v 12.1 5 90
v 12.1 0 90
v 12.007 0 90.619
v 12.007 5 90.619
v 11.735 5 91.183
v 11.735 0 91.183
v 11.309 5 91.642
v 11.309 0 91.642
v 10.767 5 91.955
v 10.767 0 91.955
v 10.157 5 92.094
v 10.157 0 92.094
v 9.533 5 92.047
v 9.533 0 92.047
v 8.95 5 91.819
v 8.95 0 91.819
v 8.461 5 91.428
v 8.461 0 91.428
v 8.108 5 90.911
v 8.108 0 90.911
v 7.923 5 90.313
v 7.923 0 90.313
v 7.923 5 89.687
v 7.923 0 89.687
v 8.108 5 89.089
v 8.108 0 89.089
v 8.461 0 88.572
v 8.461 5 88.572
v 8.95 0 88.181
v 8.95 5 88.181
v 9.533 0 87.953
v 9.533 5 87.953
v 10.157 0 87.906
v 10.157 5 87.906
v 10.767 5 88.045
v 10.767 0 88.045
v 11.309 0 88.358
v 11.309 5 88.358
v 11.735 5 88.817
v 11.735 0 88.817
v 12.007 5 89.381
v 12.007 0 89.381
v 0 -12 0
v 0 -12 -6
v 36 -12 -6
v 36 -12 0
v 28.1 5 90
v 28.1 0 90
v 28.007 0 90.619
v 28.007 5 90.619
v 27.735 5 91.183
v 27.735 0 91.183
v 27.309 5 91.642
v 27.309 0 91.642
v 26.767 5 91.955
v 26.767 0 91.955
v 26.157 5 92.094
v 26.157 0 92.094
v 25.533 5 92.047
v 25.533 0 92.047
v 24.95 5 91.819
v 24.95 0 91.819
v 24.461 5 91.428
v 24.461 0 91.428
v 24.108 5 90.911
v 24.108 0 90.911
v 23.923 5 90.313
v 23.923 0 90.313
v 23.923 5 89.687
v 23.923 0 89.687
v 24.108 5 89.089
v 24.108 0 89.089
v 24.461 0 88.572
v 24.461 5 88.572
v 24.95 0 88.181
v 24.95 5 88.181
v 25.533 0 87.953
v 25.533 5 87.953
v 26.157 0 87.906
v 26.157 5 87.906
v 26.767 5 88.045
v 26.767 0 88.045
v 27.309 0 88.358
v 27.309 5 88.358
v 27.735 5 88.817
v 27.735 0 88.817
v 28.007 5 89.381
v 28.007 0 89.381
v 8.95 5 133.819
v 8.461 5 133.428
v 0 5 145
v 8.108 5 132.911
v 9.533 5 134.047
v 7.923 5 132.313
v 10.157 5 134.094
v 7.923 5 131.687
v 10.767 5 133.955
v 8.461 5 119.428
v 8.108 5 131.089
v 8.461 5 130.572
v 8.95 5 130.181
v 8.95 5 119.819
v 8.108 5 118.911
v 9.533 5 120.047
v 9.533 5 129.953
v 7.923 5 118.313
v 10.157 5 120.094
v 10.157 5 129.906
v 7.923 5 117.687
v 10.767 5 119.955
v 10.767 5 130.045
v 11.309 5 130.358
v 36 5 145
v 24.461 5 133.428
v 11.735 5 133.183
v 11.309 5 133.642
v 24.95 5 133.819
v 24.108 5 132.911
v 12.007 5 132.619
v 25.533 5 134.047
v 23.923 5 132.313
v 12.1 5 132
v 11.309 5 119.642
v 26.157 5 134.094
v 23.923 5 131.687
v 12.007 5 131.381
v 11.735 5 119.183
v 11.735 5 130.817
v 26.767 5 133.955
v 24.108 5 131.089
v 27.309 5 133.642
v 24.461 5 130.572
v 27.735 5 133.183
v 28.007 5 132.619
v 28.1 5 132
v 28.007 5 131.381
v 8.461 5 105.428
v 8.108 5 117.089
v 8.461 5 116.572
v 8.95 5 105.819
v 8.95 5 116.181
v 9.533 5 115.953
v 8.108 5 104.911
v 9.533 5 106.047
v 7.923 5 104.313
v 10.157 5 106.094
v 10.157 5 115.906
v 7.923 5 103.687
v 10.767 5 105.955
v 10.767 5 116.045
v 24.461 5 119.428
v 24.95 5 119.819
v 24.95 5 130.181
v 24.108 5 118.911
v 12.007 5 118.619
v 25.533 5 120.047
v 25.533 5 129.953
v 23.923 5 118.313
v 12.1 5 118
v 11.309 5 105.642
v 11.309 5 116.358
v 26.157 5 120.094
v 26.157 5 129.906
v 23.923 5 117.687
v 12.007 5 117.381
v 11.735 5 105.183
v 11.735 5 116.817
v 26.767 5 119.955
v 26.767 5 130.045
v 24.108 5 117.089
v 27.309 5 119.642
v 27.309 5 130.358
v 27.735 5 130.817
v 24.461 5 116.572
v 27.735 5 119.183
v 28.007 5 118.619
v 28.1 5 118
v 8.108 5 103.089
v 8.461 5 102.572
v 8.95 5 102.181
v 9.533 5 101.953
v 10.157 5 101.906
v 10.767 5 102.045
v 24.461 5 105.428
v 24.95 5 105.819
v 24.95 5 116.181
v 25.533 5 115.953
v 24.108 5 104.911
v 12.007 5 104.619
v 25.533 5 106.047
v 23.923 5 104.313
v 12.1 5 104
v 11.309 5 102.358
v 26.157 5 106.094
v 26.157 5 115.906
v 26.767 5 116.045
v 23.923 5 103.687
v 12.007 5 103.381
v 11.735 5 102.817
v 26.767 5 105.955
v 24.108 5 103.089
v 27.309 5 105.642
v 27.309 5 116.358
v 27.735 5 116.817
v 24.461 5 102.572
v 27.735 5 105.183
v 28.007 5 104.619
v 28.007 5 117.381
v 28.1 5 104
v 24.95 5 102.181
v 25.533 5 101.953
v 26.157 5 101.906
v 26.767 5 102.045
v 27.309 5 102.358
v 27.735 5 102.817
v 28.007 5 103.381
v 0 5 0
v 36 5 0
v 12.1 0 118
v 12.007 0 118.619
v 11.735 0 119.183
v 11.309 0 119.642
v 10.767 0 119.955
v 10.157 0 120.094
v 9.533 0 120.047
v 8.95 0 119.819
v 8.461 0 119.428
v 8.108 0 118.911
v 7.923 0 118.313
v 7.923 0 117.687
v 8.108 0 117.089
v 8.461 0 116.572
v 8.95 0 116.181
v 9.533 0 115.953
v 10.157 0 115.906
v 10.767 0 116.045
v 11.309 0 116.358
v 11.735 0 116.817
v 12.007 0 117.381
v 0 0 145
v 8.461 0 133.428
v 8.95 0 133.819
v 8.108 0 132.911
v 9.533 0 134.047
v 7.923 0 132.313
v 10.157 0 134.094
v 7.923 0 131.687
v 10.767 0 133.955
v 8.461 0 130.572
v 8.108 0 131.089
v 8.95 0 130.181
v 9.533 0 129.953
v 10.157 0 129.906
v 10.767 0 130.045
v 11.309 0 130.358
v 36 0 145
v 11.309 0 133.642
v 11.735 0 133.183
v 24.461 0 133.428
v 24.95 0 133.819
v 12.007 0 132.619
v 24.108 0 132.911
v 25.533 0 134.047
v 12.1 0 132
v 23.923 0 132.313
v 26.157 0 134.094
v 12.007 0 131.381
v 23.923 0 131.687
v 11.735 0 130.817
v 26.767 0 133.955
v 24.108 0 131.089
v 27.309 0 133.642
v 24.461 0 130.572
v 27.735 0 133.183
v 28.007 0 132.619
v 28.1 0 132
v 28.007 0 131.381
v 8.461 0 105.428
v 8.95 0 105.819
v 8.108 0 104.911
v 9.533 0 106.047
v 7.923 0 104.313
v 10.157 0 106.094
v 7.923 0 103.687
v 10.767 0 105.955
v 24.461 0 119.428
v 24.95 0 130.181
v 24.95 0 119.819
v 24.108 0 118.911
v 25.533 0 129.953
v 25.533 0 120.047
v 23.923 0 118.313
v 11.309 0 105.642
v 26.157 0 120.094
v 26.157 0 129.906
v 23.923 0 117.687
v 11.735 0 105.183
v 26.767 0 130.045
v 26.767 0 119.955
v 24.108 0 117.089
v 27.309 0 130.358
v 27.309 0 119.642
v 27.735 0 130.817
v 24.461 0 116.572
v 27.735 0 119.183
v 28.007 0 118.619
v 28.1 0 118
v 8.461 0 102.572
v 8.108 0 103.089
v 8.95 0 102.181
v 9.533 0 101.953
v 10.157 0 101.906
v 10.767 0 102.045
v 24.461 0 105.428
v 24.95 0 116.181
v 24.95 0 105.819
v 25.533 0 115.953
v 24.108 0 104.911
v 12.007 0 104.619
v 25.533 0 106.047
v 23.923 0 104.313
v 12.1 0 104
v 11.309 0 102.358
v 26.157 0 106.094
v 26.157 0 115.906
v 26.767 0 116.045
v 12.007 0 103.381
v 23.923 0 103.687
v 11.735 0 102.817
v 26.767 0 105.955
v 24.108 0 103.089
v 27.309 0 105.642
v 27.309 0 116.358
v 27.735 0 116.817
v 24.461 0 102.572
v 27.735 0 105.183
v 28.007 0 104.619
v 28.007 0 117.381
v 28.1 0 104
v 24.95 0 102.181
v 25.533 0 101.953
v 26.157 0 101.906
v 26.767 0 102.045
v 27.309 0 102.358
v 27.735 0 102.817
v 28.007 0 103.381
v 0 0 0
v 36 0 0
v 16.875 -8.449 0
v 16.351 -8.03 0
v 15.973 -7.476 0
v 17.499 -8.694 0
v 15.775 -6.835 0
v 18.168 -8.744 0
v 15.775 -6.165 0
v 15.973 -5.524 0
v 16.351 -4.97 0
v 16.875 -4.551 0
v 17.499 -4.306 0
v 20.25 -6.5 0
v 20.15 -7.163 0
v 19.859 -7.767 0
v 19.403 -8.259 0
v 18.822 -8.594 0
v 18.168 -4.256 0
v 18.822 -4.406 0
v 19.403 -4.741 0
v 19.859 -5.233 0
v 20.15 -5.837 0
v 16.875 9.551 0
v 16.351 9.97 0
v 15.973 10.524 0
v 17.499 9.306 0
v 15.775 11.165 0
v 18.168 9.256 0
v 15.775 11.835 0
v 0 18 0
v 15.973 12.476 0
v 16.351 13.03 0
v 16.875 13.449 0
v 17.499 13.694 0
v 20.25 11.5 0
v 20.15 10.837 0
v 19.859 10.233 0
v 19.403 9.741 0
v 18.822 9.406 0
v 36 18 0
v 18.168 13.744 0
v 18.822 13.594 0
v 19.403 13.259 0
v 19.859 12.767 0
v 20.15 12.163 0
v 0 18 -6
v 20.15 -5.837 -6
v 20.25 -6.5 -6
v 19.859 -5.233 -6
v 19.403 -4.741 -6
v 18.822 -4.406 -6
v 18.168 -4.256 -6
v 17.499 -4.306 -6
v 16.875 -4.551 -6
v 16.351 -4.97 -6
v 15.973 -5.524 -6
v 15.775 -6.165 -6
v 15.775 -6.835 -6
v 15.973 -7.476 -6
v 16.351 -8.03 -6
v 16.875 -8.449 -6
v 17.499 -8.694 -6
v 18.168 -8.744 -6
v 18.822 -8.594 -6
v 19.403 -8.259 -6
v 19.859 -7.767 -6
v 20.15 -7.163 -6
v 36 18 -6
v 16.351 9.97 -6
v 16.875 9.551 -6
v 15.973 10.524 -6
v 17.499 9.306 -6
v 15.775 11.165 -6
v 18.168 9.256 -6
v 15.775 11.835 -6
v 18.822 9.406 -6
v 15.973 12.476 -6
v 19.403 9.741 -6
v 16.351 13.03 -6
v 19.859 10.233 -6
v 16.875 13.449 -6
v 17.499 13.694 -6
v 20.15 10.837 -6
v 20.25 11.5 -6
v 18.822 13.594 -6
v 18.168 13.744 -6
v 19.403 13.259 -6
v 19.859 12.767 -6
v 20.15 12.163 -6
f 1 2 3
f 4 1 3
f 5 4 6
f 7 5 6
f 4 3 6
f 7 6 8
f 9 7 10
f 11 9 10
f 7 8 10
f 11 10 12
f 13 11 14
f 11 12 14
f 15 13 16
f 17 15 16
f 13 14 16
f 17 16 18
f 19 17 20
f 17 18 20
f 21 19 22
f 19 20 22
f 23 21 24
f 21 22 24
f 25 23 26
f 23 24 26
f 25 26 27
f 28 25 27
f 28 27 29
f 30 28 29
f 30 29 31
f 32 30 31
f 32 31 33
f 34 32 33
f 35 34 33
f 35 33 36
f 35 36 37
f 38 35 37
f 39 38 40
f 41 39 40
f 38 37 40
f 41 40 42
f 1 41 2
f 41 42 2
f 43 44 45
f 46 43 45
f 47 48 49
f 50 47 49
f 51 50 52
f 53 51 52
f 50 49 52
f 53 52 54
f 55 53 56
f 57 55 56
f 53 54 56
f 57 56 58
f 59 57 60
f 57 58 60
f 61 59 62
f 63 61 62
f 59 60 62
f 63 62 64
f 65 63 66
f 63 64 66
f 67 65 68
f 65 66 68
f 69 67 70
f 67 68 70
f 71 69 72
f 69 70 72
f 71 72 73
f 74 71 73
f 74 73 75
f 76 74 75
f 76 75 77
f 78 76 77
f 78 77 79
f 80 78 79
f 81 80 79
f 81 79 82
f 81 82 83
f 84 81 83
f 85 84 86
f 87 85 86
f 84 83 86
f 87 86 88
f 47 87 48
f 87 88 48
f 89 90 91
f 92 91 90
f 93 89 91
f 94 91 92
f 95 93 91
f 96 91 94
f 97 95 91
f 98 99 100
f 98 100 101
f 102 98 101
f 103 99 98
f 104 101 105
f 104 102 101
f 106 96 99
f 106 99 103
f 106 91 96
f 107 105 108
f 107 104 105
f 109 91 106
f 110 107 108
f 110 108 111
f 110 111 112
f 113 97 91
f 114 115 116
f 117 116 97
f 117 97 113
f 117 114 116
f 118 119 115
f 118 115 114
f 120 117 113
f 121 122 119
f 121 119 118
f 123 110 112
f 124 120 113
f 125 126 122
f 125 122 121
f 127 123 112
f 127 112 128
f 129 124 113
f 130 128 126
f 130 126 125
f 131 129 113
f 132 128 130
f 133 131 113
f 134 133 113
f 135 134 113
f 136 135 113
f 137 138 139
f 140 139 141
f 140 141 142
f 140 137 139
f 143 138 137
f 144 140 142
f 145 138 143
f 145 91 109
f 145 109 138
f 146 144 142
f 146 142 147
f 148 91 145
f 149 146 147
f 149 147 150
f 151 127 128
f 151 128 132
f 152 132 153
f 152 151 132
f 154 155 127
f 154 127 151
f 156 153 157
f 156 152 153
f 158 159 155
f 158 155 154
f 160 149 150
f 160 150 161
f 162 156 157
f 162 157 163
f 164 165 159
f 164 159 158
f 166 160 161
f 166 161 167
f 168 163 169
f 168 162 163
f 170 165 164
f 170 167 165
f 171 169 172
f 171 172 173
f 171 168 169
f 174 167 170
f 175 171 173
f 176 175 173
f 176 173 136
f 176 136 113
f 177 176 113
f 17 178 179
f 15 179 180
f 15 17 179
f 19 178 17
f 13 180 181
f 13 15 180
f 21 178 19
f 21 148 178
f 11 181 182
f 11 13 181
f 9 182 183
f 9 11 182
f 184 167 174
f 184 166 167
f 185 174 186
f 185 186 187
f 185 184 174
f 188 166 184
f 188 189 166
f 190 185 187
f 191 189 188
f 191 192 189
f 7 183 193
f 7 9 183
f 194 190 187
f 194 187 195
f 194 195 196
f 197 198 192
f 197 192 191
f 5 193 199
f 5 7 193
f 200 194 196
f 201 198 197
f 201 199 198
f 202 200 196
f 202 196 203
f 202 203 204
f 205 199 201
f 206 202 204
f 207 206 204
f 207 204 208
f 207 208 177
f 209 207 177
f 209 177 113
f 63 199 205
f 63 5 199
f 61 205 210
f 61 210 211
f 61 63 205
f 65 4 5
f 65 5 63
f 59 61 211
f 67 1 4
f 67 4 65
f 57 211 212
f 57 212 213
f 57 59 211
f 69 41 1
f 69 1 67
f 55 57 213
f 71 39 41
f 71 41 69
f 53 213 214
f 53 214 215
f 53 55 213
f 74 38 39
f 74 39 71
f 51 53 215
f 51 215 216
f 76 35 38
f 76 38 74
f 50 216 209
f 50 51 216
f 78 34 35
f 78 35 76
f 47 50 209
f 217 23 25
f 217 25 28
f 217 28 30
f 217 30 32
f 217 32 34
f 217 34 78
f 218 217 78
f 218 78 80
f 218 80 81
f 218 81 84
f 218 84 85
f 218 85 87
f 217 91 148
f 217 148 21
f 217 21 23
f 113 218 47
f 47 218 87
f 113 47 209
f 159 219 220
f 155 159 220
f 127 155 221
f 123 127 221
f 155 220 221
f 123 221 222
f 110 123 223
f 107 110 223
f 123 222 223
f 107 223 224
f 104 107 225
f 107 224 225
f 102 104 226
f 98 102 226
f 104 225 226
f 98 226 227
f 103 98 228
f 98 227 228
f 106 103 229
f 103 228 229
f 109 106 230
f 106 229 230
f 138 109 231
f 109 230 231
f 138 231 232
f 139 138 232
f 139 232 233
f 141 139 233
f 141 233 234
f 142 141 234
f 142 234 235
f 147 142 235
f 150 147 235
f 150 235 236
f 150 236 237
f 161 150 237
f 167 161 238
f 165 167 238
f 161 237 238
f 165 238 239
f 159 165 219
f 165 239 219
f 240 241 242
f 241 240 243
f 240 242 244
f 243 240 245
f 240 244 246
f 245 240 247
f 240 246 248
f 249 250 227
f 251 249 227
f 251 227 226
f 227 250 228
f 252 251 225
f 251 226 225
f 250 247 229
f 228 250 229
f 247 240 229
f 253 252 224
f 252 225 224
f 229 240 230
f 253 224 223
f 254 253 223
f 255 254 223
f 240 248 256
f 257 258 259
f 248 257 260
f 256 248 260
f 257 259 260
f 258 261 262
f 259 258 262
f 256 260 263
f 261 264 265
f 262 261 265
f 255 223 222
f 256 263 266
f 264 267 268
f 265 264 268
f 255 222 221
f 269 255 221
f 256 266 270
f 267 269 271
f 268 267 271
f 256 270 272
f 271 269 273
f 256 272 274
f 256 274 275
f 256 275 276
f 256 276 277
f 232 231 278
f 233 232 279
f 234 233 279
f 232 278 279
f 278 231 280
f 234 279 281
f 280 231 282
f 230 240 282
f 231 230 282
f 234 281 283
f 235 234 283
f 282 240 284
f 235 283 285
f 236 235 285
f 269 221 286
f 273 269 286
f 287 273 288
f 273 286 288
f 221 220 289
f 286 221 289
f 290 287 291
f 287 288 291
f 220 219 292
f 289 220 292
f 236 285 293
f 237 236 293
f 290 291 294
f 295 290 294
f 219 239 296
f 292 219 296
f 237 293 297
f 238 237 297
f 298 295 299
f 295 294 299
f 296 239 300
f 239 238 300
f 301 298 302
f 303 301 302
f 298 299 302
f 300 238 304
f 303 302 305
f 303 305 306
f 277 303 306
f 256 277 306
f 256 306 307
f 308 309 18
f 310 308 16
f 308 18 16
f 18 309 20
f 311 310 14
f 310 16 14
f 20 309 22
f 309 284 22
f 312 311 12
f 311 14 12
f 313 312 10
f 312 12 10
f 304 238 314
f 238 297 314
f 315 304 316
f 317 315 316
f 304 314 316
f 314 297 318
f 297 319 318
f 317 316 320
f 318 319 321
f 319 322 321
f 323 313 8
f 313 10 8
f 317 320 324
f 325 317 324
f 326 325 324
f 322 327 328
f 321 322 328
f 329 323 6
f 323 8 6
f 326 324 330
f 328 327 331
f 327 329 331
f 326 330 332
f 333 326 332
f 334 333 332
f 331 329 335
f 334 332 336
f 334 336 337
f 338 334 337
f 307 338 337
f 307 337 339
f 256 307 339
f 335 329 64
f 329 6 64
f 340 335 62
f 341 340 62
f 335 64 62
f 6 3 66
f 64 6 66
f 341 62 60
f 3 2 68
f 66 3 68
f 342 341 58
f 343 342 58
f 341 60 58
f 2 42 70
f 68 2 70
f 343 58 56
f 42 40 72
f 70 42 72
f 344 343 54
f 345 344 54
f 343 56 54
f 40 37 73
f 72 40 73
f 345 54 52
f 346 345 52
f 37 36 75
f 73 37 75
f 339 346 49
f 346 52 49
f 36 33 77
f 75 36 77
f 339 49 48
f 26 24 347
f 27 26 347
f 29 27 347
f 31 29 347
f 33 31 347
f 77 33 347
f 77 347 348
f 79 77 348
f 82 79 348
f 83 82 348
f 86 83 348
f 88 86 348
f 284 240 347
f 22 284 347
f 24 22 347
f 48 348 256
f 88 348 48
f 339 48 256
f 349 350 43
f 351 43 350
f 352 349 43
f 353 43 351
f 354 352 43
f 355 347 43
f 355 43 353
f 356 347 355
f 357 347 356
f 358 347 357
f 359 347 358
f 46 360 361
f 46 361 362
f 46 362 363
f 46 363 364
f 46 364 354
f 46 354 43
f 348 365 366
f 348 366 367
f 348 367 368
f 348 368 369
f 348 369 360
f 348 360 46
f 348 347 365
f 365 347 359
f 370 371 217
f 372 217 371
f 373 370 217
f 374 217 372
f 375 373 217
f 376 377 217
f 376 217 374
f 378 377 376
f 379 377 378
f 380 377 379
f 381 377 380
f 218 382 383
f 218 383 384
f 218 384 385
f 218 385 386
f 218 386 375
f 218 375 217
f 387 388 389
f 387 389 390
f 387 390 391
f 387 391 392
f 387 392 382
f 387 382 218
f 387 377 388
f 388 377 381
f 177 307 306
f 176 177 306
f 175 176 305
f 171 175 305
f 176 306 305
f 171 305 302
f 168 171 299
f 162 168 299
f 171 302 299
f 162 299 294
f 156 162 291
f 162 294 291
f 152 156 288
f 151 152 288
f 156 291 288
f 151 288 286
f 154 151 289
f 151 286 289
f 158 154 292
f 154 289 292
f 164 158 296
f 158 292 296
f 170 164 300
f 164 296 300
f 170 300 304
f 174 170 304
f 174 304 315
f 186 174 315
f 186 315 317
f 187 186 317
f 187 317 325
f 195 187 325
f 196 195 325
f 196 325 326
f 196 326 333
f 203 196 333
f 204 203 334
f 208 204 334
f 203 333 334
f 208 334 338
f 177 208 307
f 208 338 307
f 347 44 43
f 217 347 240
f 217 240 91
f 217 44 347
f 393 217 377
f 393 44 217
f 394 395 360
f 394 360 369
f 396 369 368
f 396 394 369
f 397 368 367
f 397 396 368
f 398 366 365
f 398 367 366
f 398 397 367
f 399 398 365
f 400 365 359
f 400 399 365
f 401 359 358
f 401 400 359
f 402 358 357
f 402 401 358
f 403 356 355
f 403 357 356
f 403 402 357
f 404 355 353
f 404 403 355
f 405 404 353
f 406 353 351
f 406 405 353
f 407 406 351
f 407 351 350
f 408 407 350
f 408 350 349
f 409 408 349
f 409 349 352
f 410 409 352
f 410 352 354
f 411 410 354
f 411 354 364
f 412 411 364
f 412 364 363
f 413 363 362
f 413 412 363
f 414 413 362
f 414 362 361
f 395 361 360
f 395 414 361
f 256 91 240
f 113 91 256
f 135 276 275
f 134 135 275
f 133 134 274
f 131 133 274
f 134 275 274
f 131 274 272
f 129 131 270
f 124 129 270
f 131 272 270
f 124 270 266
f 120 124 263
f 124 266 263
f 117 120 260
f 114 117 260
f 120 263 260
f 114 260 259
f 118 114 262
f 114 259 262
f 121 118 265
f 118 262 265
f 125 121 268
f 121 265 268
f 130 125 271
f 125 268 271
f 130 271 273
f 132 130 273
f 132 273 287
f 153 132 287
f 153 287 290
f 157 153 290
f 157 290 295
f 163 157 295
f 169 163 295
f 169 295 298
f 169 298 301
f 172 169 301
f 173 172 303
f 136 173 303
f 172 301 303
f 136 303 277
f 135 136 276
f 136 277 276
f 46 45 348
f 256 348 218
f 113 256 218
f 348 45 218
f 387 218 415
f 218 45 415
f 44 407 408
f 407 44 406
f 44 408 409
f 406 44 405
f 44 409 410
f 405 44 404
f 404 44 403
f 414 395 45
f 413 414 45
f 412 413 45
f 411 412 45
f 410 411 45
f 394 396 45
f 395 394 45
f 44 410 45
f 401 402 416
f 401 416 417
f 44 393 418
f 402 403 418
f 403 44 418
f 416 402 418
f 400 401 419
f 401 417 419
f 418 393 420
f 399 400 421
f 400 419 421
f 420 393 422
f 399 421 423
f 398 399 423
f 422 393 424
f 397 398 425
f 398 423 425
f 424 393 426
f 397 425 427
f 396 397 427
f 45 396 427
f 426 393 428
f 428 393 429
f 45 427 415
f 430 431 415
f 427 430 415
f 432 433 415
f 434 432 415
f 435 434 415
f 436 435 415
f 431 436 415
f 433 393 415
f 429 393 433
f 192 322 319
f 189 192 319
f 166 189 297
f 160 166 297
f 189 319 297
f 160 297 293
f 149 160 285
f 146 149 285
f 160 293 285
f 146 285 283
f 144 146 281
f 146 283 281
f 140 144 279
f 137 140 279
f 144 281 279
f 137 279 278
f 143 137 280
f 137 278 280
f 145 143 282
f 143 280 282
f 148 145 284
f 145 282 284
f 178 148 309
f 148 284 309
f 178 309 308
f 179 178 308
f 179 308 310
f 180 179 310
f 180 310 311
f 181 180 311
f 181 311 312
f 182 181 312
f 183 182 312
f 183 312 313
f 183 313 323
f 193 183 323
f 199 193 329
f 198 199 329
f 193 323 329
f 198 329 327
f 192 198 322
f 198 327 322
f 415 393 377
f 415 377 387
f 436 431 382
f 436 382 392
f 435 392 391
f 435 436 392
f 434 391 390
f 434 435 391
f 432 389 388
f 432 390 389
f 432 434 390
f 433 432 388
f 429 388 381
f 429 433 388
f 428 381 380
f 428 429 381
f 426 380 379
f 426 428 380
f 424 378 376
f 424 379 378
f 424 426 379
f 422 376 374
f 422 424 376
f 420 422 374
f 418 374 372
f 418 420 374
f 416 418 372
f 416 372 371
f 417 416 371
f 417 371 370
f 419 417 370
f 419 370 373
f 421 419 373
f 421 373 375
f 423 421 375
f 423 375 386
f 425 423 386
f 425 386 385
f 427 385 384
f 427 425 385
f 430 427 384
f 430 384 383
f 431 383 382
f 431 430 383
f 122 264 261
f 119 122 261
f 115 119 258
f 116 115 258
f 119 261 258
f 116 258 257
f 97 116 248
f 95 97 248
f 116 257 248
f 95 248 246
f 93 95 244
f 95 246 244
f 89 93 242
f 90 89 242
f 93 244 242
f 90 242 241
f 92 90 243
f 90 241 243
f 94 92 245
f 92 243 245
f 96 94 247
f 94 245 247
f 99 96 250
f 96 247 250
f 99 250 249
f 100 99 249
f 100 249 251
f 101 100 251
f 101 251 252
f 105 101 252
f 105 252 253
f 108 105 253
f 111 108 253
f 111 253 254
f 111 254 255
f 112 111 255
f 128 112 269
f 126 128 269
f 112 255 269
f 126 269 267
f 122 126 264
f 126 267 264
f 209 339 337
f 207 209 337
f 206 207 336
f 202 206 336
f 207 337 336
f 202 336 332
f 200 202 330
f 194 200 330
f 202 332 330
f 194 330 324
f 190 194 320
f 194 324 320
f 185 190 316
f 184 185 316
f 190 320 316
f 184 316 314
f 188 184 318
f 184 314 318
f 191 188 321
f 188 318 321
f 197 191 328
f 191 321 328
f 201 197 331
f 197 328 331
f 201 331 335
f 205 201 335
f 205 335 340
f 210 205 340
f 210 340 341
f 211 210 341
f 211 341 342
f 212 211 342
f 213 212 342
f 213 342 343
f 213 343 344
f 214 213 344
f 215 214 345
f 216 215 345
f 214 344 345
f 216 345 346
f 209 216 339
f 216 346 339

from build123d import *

# Parameters (mm, degrees)
BOX007_W          = 36
BOX007_H          = 5
BOX007_DEPTH      = 145
SKETCH001_R       = 2.1
POCKET001_DEPTH   = 5
CYLINDER003_R     = 2.25
CYLINDER003_DEPTH = 10
CYLINDER004_R     = 2.25
CYLINDER004_DEPTH = 10
BOX006_W          = 36
BOX006_H          = 30
BOX006_DEPTH      = 6


with BuildPart() as pocket001:
    # Box007 → Box007 (new body)
    with BuildSketch(Plane.XY):
        with Locations((18, 2.5)):
            Rectangle(BOX007_W, BOX007_H)
    extrude(amount=BOX007_DEPTH)

    # Sketch001 (on Face3 of Box007) → Pocket001 (cut)
    with BuildSketch(Plane.XZ):
        with Locations((10, 132)):
            Circle(SKETCH001_R)
        with Locations((26, 132)):
            Circle(SKETCH001_R)
        with Locations((10, 118)):
            Circle(SKETCH001_R)
        with Locations((26, 118)):
            Circle(SKETCH001_R)
        with Locations((10, 104)):
            Circle(SKETCH001_R)
        with Locations((26, 104)):
            Circle(SKETCH001_R)
        with Locations((10, 90)):
            Circle(SKETCH001_R)
        with Locations((26, 90)):
            Circle(SKETCH001_R)
    extrude(amount=-POCKET001_DEPTH, mode=Mode.SUBTRACT)


with BuildPart() as cilindro003:
    # Cylinder003 → Cylinder003 (new body)
    with BuildSketch(Plane(origin=(18, 11.5, -8), x_dir=(1, 0, 0), z_dir=(0, 0, 1))):
        Circle(CYLINDER003_R)
    extrude(amount=CYLINDER003_DEPTH)


with BuildPart() as cilindro004:
    # Cylinder004 → Cylinder004 (new body)
    with BuildSketch(Plane(origin=(18, -6.5, -8), x_dir=(1, 0, 0), z_dir=(0, 0, 1))):
        Circle(CYLINDER004_R)
    extrude(amount=CYLINDER004_DEPTH)


with BuildPart() as modulo_tensionador2:
    # Box006 → Box006 (new body)
    with BuildSketch(Plane(origin=(0, -12, -6), x_dir=(1, 0, 0), z_dir=(0, 0, 1))):
        with Locations((18, 15)):
            Rectangle(BOX006_W, BOX006_H)
    extrude(amount=BOX006_DEPTH)

    # Cut003001005: cut Cilindro004
    add(cilindro004.part, mode=Mode.SUBTRACT)

    # Cut003001006: cut Cilindro003
    add(cilindro003.part, mode=Mode.SUBTRACT)

    # Fusion001002018: union Pocket001
    add(pocket001.part)


solid = modulo_tensionador2.part
